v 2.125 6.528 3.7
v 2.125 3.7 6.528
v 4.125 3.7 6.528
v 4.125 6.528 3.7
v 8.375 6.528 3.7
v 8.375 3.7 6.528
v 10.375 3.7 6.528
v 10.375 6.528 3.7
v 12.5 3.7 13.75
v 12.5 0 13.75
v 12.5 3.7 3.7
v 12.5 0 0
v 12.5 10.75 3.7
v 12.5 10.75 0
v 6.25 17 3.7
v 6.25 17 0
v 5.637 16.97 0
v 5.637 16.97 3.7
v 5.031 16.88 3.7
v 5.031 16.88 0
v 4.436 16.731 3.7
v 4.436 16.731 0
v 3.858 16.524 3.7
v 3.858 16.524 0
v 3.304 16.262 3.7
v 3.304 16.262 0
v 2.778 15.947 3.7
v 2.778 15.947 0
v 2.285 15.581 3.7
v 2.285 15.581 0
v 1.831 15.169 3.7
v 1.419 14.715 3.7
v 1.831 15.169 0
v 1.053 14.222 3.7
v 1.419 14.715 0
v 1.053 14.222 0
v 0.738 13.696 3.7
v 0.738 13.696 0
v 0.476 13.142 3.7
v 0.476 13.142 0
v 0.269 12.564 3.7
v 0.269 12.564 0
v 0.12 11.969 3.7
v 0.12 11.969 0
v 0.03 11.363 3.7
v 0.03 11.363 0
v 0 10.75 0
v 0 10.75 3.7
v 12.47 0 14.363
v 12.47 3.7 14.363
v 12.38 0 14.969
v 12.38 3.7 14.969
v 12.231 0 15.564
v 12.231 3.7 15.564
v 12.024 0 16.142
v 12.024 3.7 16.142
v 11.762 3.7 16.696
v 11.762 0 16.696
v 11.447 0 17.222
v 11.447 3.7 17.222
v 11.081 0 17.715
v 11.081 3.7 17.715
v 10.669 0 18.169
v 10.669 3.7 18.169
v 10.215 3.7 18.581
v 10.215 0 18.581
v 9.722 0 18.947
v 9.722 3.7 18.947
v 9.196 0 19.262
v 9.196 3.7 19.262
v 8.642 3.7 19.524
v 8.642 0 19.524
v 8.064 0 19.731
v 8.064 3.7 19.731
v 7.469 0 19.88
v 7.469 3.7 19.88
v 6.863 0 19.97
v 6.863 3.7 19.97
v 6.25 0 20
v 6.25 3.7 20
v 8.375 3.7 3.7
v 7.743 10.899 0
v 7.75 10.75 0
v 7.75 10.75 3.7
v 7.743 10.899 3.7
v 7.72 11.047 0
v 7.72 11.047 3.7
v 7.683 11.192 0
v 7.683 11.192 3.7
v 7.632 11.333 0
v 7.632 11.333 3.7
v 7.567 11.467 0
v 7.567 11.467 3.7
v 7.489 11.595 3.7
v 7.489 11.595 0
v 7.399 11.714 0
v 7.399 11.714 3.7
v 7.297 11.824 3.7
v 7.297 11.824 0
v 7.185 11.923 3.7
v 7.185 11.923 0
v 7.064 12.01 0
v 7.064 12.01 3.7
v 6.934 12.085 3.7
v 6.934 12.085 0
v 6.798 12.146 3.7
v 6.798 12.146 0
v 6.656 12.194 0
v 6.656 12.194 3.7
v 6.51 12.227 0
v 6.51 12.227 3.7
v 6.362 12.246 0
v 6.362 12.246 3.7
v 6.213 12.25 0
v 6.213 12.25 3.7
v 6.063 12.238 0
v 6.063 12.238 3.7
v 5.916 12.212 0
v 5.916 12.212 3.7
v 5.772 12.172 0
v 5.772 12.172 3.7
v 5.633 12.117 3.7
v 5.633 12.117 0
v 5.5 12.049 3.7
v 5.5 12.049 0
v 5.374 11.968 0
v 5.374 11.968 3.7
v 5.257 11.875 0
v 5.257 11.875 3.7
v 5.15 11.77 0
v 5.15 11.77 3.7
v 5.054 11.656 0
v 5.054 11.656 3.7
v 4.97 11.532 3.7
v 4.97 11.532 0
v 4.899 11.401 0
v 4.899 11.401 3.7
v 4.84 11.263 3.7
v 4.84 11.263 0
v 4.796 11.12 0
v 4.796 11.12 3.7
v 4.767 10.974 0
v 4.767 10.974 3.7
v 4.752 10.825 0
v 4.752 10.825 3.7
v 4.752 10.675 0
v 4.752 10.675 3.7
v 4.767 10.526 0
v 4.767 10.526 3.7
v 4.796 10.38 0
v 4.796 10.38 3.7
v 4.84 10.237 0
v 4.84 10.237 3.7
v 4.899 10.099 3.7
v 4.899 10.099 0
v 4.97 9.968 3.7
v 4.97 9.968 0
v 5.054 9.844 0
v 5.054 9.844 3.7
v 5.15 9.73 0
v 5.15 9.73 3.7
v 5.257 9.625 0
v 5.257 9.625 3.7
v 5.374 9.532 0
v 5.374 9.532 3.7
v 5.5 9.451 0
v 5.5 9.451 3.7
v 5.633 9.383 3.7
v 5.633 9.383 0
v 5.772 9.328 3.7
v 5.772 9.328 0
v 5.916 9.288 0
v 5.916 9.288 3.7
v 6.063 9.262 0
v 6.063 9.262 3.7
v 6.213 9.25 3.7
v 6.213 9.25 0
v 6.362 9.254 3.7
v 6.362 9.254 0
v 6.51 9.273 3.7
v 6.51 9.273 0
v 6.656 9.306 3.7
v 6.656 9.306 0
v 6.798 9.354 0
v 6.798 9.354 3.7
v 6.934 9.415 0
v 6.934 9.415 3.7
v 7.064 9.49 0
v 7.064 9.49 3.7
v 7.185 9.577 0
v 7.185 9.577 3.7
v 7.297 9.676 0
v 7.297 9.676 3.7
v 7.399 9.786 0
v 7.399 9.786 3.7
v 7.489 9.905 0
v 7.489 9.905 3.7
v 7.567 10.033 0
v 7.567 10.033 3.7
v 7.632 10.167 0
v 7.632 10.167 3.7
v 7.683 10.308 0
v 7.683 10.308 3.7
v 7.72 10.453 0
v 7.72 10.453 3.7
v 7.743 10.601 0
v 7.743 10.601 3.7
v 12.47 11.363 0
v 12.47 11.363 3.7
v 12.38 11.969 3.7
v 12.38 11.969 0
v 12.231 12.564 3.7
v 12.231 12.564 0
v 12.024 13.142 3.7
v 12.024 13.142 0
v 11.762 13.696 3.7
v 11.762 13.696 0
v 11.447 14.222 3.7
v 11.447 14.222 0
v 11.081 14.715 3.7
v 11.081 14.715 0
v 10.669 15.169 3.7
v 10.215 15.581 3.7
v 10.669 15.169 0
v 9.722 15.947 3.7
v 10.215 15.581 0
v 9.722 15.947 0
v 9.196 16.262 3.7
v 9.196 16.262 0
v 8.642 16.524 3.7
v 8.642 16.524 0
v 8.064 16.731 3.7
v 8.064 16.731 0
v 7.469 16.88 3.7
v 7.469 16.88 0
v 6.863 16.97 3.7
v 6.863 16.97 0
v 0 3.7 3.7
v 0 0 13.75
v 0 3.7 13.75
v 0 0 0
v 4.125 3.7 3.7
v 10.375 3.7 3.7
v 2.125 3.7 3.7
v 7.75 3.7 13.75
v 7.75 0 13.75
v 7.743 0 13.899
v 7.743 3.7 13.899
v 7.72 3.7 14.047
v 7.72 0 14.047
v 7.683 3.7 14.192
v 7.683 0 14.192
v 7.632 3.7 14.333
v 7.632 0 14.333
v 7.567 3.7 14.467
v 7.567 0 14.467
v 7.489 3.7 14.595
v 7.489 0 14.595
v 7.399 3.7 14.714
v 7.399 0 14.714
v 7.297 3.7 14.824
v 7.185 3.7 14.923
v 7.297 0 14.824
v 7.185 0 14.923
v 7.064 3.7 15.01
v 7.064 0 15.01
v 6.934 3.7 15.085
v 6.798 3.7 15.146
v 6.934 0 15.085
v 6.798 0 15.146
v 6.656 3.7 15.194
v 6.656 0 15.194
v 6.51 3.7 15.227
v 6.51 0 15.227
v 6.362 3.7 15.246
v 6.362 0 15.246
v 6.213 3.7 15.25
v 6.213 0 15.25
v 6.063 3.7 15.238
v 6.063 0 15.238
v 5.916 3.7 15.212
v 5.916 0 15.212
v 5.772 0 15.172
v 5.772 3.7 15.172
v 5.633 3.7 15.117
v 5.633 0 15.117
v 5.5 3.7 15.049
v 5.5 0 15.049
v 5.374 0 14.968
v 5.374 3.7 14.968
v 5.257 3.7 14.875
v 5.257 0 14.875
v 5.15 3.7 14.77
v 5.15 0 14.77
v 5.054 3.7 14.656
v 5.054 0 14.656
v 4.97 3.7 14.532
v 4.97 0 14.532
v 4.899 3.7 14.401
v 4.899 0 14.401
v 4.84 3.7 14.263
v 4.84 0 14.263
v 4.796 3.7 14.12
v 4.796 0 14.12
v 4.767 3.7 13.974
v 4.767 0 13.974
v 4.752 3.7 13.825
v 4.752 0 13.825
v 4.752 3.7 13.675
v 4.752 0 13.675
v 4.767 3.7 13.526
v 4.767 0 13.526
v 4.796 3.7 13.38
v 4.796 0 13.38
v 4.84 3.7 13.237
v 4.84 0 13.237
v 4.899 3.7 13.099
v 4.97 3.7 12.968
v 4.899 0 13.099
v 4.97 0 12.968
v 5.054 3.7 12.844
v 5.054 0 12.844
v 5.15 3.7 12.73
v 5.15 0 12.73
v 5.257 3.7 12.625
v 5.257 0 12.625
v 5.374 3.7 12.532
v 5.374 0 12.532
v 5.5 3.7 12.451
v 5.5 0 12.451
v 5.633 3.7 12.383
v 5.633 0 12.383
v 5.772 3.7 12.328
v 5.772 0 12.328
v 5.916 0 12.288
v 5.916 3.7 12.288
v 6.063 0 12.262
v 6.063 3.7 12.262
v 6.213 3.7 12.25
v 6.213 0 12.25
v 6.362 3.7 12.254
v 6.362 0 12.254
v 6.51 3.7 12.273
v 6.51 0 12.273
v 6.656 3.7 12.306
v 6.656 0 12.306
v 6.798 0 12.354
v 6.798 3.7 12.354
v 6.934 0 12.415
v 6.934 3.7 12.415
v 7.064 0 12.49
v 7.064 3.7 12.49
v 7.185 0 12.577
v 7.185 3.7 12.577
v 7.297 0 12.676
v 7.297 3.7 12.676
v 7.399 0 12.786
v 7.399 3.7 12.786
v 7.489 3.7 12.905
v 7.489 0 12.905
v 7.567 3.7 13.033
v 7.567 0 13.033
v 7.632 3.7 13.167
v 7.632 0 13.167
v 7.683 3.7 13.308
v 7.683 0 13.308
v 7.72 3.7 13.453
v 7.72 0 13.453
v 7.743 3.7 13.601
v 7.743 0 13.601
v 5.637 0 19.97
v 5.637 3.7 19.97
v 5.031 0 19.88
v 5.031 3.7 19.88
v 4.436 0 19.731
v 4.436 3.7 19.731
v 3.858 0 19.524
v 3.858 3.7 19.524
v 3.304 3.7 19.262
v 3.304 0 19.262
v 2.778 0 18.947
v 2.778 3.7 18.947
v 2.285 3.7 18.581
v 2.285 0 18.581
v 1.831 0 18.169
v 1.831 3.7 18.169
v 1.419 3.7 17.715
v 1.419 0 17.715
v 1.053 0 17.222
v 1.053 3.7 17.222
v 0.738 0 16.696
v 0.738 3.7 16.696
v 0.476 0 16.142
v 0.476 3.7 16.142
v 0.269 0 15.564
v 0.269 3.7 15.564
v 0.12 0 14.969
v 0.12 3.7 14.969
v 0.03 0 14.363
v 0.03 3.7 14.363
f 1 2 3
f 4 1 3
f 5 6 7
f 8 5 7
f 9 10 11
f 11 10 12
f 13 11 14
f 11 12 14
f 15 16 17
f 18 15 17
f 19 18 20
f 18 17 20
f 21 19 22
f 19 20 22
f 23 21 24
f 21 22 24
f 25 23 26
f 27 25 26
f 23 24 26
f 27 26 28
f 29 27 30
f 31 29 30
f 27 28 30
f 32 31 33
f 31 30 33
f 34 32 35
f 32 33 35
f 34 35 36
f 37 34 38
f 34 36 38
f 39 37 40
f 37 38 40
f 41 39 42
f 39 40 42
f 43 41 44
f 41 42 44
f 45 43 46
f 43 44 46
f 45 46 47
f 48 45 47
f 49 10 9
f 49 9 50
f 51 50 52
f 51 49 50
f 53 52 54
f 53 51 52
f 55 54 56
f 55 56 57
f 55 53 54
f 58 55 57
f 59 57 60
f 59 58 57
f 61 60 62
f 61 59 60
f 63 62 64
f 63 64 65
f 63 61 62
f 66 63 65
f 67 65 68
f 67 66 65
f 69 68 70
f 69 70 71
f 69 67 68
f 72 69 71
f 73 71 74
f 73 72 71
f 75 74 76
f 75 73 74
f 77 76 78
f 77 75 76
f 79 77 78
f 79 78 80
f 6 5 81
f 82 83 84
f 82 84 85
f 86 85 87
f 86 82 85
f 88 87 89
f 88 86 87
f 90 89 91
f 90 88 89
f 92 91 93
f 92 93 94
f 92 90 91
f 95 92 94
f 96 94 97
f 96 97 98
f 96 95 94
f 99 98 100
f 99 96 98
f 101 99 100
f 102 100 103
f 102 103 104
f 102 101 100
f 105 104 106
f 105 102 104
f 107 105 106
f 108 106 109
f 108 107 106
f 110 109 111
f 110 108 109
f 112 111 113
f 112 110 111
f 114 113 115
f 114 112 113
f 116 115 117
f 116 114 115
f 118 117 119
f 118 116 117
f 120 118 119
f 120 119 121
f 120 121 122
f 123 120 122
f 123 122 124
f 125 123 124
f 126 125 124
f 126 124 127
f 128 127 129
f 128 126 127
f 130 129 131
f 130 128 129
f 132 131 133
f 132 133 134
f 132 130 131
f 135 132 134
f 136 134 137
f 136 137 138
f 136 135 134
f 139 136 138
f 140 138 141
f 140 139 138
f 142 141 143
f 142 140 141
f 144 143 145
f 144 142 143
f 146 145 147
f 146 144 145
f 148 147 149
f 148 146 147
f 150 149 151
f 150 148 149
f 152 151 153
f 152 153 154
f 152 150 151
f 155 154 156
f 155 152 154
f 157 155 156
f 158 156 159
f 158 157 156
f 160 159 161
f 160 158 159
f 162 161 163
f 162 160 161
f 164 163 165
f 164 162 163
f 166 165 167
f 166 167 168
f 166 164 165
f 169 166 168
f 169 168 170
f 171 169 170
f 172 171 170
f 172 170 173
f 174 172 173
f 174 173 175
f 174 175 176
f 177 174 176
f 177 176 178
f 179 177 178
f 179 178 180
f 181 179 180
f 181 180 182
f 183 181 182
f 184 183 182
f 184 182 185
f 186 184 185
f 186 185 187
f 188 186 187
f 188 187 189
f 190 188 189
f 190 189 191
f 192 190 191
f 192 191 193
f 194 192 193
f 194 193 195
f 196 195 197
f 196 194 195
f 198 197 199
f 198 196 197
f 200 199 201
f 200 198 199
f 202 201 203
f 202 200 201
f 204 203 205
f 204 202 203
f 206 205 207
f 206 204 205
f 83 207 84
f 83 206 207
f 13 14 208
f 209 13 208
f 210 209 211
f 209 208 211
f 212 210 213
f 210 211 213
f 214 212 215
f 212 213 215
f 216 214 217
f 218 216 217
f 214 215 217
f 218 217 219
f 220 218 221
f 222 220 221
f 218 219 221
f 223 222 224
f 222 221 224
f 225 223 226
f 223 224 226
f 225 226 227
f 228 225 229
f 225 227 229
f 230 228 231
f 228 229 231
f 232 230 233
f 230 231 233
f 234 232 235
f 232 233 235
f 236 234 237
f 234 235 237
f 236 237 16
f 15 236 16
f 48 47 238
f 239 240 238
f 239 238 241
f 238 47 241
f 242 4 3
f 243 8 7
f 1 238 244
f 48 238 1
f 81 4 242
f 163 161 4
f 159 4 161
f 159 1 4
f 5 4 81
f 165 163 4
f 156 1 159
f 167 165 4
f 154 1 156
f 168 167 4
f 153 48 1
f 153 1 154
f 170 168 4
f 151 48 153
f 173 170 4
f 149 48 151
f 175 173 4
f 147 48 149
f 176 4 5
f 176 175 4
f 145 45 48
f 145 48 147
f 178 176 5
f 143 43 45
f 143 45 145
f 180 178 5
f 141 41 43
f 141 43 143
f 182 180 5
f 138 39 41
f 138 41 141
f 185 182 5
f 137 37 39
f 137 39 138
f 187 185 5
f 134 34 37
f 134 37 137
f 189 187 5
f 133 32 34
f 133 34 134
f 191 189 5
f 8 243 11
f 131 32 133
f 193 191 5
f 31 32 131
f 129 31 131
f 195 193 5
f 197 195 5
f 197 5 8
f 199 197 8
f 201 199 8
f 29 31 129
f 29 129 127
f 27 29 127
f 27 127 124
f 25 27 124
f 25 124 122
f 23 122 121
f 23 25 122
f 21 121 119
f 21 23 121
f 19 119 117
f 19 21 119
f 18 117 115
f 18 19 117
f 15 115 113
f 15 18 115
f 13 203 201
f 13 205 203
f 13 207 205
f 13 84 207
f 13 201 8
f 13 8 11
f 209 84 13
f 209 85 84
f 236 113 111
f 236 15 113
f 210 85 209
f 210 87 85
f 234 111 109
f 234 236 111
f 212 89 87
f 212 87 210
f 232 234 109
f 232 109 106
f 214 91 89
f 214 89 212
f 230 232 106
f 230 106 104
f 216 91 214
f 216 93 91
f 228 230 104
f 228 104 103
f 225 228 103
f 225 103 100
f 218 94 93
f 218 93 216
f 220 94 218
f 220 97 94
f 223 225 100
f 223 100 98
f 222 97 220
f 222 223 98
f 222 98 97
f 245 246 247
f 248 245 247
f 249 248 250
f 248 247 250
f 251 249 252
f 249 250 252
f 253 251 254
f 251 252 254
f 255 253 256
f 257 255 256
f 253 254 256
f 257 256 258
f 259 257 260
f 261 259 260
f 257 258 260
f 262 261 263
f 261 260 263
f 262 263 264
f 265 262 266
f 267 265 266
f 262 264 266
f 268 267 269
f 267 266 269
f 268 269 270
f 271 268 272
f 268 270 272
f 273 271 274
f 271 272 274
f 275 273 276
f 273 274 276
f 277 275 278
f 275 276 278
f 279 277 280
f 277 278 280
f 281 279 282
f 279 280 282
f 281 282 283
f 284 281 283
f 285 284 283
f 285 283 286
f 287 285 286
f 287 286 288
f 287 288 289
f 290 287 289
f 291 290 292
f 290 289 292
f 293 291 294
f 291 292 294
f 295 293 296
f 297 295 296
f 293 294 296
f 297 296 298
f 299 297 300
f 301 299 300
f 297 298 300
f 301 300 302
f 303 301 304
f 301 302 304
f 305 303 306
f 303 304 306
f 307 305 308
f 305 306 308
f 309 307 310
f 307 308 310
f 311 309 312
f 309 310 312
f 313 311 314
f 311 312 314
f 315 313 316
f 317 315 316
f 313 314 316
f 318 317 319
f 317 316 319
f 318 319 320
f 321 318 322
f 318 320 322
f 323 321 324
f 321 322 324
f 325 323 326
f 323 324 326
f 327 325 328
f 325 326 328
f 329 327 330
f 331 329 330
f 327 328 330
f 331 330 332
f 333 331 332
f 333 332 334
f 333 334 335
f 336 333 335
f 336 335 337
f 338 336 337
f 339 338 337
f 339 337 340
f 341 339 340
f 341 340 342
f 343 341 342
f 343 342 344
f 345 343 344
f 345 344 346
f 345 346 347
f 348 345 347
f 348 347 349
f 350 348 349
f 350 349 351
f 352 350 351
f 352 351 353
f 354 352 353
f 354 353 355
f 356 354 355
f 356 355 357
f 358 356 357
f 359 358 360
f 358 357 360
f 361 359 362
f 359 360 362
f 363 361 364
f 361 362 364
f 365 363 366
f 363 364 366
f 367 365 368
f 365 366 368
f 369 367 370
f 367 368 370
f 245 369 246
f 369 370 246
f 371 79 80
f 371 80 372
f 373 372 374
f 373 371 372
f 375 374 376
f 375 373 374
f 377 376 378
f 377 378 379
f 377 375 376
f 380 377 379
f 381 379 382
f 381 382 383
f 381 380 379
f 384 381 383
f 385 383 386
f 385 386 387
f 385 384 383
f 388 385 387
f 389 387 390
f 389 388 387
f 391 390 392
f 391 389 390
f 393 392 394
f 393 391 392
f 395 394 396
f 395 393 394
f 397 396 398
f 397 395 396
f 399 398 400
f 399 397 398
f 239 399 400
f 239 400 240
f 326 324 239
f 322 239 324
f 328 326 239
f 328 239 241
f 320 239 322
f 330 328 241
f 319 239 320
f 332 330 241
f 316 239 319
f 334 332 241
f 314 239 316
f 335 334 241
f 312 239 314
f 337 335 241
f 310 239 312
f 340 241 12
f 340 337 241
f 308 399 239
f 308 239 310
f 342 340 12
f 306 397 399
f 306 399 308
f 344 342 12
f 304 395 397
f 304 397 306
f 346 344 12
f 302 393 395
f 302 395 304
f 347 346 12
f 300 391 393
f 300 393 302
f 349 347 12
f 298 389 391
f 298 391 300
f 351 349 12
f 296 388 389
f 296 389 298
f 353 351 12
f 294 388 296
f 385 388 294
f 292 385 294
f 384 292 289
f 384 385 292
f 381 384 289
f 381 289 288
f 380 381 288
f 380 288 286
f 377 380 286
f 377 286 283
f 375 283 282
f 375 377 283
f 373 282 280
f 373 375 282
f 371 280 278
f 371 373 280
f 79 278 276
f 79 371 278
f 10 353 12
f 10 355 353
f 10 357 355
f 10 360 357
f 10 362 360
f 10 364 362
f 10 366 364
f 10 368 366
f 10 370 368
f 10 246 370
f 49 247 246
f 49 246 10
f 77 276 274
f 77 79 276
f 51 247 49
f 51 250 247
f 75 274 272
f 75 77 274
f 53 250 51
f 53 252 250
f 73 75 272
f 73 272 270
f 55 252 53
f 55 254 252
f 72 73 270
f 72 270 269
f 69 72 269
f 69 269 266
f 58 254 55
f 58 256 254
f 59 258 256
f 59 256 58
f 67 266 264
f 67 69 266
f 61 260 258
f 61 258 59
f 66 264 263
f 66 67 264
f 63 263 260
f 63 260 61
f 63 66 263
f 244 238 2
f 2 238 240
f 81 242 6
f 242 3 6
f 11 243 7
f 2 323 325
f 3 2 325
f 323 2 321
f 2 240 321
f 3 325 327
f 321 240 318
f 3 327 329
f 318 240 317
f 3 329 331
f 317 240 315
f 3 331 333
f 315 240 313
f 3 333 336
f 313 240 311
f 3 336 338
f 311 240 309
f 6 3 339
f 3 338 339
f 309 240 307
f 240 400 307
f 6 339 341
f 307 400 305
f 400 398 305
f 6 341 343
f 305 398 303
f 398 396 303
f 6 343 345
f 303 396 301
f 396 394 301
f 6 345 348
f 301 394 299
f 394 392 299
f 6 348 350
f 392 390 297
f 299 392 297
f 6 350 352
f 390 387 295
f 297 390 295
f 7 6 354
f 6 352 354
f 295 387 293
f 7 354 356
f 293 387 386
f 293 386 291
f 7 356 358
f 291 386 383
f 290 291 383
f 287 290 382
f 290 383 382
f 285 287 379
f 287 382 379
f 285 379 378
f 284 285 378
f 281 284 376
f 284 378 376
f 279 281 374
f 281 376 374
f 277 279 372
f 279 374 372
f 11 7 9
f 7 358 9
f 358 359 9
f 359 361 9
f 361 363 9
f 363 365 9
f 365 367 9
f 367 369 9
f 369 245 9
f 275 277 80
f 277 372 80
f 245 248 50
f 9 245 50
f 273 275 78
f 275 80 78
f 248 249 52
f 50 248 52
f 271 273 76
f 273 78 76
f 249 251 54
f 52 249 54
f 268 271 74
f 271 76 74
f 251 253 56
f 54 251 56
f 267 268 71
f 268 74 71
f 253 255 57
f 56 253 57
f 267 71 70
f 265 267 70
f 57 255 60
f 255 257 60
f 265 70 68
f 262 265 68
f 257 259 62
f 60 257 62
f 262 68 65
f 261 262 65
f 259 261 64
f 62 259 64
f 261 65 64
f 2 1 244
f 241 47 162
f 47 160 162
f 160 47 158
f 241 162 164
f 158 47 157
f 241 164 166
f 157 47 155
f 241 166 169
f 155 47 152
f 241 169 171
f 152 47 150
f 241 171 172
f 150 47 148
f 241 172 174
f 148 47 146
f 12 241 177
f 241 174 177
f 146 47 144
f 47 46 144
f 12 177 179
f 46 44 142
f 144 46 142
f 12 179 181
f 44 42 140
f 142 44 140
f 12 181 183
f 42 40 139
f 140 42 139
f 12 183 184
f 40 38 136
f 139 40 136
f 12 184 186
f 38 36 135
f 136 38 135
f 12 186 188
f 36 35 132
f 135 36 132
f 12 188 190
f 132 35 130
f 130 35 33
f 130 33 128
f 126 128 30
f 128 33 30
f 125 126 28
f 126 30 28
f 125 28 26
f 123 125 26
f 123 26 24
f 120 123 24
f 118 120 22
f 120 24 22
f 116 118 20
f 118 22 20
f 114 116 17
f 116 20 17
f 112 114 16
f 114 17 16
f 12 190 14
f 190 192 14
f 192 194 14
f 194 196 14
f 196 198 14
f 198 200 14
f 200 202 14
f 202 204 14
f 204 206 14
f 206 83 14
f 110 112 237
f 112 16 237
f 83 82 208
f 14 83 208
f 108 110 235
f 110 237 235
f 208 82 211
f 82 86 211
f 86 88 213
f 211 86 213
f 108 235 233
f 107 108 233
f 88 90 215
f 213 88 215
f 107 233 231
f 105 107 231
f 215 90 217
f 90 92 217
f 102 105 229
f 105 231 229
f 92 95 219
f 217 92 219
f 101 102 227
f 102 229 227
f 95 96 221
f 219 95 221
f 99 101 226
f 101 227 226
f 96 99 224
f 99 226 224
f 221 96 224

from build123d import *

# Parameters (mm, degrees)
F0_R     = 1.5
F2_DEPTH = 3.7
F1_R     = 1.5
F3_DEPTH = 3.7
F6_W     = 2
F6_H     = 4
F7_DEPTH = 4


with BuildPart() as f2:
    # F0 (on Front) → F2 (new body)
    with BuildSketch(Plane.XZ):
        with BuildLine():
            Line((0, 13.75), (0, 0))
            Line((0, 0), (12.5, 0))
            Line((12.5, 0), (12.5, 13.75))
            ThreePointArc((12.5, 13.75), (10.6694173824, 18.1694173824), (6.25, 20))
            ThreePointArc((6.25, 20), (1.8305826176, 18.1694173824), (0, 13.75))
        make_face()
        with Locations((6.25, 13.75)):
            Circle(F0_R, mode=Mode.SUBTRACT)
    extrude(amount=-F2_DEPTH)

    # F1 (on Top) → F3 (join)
    with BuildSketch(Plane.XY):
        with BuildLine():
            Line((0, 10.75), (0, 0))
            Line((0, 0), (12.5, 0))
            Line((12.5, 0), (12.5, 10.75))
            ThreePointArc((12.5, 10.75), (10.6694173824, 15.1694173824), (6.25, 17))
            ThreePointArc((6.25, 17), (1.8305826176, 15.1694173824), (0, 10.75))
        make_face()
        with Locations((6.25, 10.75)):
            Circle(F1_R, mode=Mode.SUBTRACT)
    extrude(amount=F3_DEPTH)

    # F6 (on face) → F7 (join)
    with BuildSketch(Plane(origin=(0, 5.1142135624, 5.1142135624), x_dir=(1, 0, 0), z_dir=(0, -0.7071067812, -0.7071067812))):
        with Locations((9.375, 0)):
            Rectangle(F6_W, F6_H)
        with Locations((3.125, 0)):
            Rectangle(F6_W, F6_H)
    extrude(amount=F7_DEPTH)


solid = f2.part
